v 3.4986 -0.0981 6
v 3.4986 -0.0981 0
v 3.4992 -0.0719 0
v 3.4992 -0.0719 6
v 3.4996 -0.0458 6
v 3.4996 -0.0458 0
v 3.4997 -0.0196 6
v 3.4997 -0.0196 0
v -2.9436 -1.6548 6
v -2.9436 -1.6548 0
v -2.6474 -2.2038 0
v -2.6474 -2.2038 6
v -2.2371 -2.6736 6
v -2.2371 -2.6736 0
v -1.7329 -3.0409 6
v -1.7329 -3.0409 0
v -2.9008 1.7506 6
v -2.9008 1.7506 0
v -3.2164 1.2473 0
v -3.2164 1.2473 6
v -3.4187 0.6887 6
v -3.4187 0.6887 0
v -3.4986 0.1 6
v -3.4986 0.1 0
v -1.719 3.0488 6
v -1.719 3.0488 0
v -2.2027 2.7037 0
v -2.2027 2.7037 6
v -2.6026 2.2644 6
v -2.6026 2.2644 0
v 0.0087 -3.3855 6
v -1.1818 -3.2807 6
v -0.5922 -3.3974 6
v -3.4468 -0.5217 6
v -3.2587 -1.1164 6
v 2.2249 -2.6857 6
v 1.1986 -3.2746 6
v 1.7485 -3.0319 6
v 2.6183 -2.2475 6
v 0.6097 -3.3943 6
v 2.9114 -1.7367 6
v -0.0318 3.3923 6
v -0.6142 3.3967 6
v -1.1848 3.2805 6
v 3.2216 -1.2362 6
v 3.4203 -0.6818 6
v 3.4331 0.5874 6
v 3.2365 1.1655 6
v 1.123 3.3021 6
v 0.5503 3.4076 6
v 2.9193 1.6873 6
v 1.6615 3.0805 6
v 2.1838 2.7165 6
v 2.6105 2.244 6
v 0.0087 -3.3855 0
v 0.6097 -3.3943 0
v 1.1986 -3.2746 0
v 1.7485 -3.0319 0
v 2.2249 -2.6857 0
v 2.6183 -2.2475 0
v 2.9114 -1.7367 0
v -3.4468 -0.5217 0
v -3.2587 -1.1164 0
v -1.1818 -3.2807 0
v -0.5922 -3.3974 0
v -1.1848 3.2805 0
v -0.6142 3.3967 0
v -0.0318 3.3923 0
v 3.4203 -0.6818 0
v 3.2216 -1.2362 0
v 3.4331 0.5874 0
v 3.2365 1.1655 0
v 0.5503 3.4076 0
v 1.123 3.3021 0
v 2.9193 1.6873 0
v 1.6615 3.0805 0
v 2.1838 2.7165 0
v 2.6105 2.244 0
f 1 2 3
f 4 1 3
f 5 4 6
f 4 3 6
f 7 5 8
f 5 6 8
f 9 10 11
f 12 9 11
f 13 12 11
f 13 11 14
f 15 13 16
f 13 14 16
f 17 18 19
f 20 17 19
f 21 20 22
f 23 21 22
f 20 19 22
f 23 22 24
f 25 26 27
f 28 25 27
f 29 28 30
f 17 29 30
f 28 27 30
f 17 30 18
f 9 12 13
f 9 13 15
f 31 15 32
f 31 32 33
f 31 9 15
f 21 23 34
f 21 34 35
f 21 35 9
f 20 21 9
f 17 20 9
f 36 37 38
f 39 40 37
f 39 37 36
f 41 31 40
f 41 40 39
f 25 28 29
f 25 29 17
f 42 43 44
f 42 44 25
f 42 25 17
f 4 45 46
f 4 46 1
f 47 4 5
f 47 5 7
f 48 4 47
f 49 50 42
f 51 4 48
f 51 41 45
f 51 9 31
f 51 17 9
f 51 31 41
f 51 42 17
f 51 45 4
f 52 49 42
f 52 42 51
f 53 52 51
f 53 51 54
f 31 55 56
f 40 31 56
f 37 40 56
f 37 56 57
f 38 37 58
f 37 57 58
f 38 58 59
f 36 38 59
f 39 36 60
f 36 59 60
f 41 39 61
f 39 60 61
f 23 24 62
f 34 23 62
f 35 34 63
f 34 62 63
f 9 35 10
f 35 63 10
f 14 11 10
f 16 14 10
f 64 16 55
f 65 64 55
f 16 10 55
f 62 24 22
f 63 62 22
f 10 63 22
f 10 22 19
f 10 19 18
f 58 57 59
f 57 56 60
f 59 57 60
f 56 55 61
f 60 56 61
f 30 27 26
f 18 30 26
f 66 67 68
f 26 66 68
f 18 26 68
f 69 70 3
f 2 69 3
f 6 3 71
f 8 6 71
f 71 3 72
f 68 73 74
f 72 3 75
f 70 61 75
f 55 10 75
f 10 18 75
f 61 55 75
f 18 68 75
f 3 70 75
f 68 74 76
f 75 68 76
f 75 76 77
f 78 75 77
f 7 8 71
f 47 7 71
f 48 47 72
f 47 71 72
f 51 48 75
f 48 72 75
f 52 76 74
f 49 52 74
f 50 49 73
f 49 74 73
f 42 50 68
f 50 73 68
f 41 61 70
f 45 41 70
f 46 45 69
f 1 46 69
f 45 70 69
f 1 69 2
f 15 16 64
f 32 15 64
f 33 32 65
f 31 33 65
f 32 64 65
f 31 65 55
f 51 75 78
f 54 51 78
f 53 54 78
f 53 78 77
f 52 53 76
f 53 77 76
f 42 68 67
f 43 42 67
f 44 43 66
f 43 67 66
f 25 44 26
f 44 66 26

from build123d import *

# Parameters (mm, degrees)
F1_DEPTH = 6


with BuildPart() as f1:
    # F0 (on Top) → F1 (new body)
    with BuildSketch(Plane.XY):
        with BuildLine():
            ThreePointArc((1.8973233508, 1.0666051117), (1.0588867343, 1.8135272069), (-0.005583815, 2.1709779391))
            ThreePointArc((-0.005583815, 2.1709779391), (-1.0389548617, 1.8249950782), (-1.8619798916, 1.1107194588))
            ThreePointArc((-1.8619798916, 1.1107194588), (-2.1000901385, 0.0125561815), (-1.887280493, -1.090789244))
            ThreePointArc((-1.887280493, -1.090789244), (-1.0429983237, -1.8228679145), (0.0203406306, -2.1664691802))
            ThreePointArc((0.0203406306, -2.1664691802), (1.0412894646, -1.8236634498), (1.8573263997, -1.1208576368))
            ThreePointArc((1.8573263997, -1.1208576368), (2.038872301, -0.5632237434), (2.1002855998, 0.0199939519))
            ThreePointArc((2.1002855998, 0.0199939519), (2.0490767616, 0.5530484975), (1.8973233508, 1.0666051117))
        make_face()
        with BuildLine():
            ThreePointArc((-0.005583815, 2.1709779391), (-0.5902408798, 2.1811969924), (-1.1642709913, 2.0697620621))
            ThreePointArc((-1.1642709913, 2.0697620621), (-1.5644851841, 1.6276052627), (-1.8619798916, 1.1107194588))
            ThreePointArc((-1.8619798916, 1.1107194588), (-1.0389548617, 1.8249950782), (-0.005583815, 2.1709779391))
        make_face()
        with BuildLine():
            ThreePointArc((1.2254840668, 2.0531222957), (0.6904787067, 2.450500715), (0.0767181369, 2.7101895796))
            ThreePointArc((0.0767181369, 2.7101895796), (-0.5843437882, 2.4685852693), (-1.1642709913, 2.0697620621))
            ThreePointArc((-1.1642709913, 2.0697620621), (-0.5902408798, 2.1811969924), (-0.005583815, 2.1709779391))
            ThreePointArc((-0.005583815, 2.1709779391), (0.6165382251, 2.1808664854), (1.2254840668, 2.0531222957))
        make_face()
        with BuildLine():
            ThreePointArc((0.0767181369, 2.7101895796), (-0.739408057, 2.819712583), (-1.5521012699, 2.6870966167))
            ThreePointArc((-1.5521012699, 2.6870966167), (-2.0648276585, 2.0630888944), (-2.3781173595, 1.31869414))
            ThreePointArc((-2.3781173595, 1.31869414), (-1.8198590259, 1.7728783139), (-1.1642709913, 2.0697620621))
            ThreePointArc((-1.1642709913, 2.0697620621), (-0.5843437882, 2.4685852693), (0.0767181369, 2.7101895796))
        make_face()
        with BuildLine():
            ThreePointArc((-1.1642709913, 2.0697620621), (-1.8198590259, 1.7728783139), (-2.3781173595, 1.31869414))
            ThreePointArc((-2.3781173595, 1.31869414), (-2.4675701182, 0.6431282617), (-2.3911766581, -0.0340386978))
            ThreePointArc((-2.3911766581, -0.0340386978), (-2.1918687447, 0.5685227429), (-1.8619798916, 1.1107194588))
            ThreePointArc((-1.8619798916, 1.1107194588), (-1.5644851841, 1.6276052627), (-1.1642709913, 2.0697620621))
        make_face()
        with BuildLine():
            ThreePointArc((-1.8619798916, 1.1107194588), (-2.1918687447, 0.5685227429), (-2.3911766581, -0.0340386978))
            ThreePointArc((-2.3911766581, -0.0340386978), (-2.1950769, -0.5890444341), (-1.887280493, -1.090789244))
            ThreePointArc((-1.887280493, -1.090789244), (-2.1000901385, 0.0125561815), (-1.8619798916, 1.1107194588))
        make_face()
        with BuildLine():
            ThreePointArc((-2.3781173595, 1.31869414), (-2.8167952616, 0.7101612068), (-3.0781623915, 0.0069984548))
            ThreePointArc((-3.0781623915, 0.0069984548), (-2.8091128769, -0.7177567759), (-2.352128639, -1.3413136635))
            ThreePointArc((-2.352128639, -1.3413136635), (-2.4490500667, -0.6899880247), (-2.3911766581, -0.0340386978))
            ThreePointArc((-2.3911766581, -0.0340386978), (-2.4675701182, 0.6431282617), (-2.3781173595, 1.31869414))
        make_face()
        with BuildLine():
            ThreePointArc((-1.5521012699, 2.6870966167), (-2.2966660757, 2.3199385917), (-2.9008495072, 1.7506020071))
            ThreePointArc((-2.9008495072, 1.7506020071), (-3.1294418909, 0.8930307855), (-3.0781623915, 0.0069984548))
            ThreePointArc((-3.0781623915, 0.0069984548), (-2.8167952616, 0.7101612068), (-2.3781173595, 1.31869414))
            ThreePointArc((-2.3781173595, 1.31869414), (-2.0648276585, 2.0630888944), (-1.5521012699, 2.6870966167))
        make_face()
        with BuildLine():
            ThreePointArc((1.5893790918, 2.6352836652), (0.8408625527, 3.1467868797), (-0.0318499268, 3.3923178874))
            ThreePointArc((-0.0318499268, 3.3923178874), (-0.8459741382, 3.1561123524), (-1.5521012699, 2.6870966167))
            ThreePointArc((-1.5521012699, 2.6870966167), (-0.739408057, 2.819712583), (0.0767181369, 2.7101895796))
            ThreePointArc((0.0767181369, 2.7101895796), (0.8382093308, 2.7769528833), (1.5893790918, 2.6352836652))
        make_face()
        with BuildLine():
            ThreePointArc((2.9193048787, 1.687267141), (2.4106234404, 2.4924162866), (1.6614974205, 3.0804912468))
            ThreePointArc((1.6614974205, 3.0804912468), (0.839387863, 3.3697978552), (-0.0318499268, 3.3923178874))
            ThreePointArc((-0.0318499268, 3.3923178874), (0.8408625527, 3.1467868797), (1.5893790918, 2.6352836652))
            ThreePointArc((1.5893790918, 2.6352836652), (2.3249996844, 2.2603976164), (2.9193048787, 1.687267141))
        make_face()
        with BuildLine():
            ThreePointArc((-0.0318499268, 3.3923178874), (-0.9025110684, 3.3534434902), (-1.7190434975, 3.0487521142))
            ThreePointArc((-1.7190434975, 3.0487521142), (-2.414314987, 2.4946917294), (-2.9008495072, 1.7506020071))
            ThreePointArc((-2.9008495072, 1.7506020071), (-2.2966660757, 2.3199385917), (-1.5521012699, 2.6870966167))
            ThreePointArc((-1.5521012699, 2.6870966167), (-0.8459741382, 3.1561123524), (-0.0318499268, 3.3923178874))
        make_face()
        with BuildLine():
            ThreePointArc((1.8973233508, 1.0666051117), (1.6145801233, 1.5960779783), (1.2254840668, 2.0531222957))
            ThreePointArc((1.2254840668, 2.0531222957), (0.6165382251, 2.1808664854), (-0.005583815, 2.1709779391))
            ThreePointArc((-0.005583815, 2.1709779391), (1.0588867343, 1.8135272069), (1.8973233508, 1.0666051117))
        make_face()
        with BuildLine():
            ThreePointArc((2.3580216147, 1.3446741637), (2.0618651, 2.042486798), (1.5893790918, 2.6352836652))
            ThreePointArc((1.5893790918, 2.6352836652), (0.8382093308, 2.7769528833), (0.0767181369, 2.7101895796))
            ThreePointArc((0.0767181369, 2.7101895796), (0.6904787067, 2.450500715), (1.2254840668, 2.0531222957))
            ThreePointArc((1.2254840668, 2.0531222957), (1.8346212871, 1.7674284762), (2.3580216147, 1.3446741637))
        make_face()
        with BuildLine():
            ThreePointArc((3.132299411, 0.6160982888), (3.0785345893, 1.1621681975), (2.9193048787, 1.687267141))
            ThreePointArc((2.9193048787, 1.687267141), (2.3249996844, 2.2603976164), (1.5893790918, 2.6352836652))
            ThreePointArc((1.5893790918, 2.6352836652), (2.0618651, 2.042486798), (2.3580216147, 1.3446741637))
            ThreePointArc((2.3580216147, 1.3446741637), (2.8033879252, 0.7424702765), (3.073177752, 0.0437470684))
            ThreePointArc((3.073177752, 0.0437470684), (3.1174797781, 0.3283999702), (3.132299411, 0.6160982888))
        make_face()
        with BuildLine():
            ThreePointArc((2.9114065493, -1.7367297688), (3.3355847665, -0.9642066281), (3.4986248701, -0.0981020804))
            ThreePointArc((3.4986248701, -0.0981020804), (3.499449935, -0.058865091), (3.4997249747, -0.0196203918))
            ThreePointArc((3.4997249747, -0.0196203918), (3.3506515798, 0.8818163139), (2.9193048787, 1.687267141))
            ThreePointArc((2.9193048787, 1.687267141), (3.0785345893, 1.1621681975), (3.132299411, 0.6160982888))
            ThreePointArc((3.132299411, 0.6160982888), (3.1174797781, 0.3283999702), (3.073177752, 0.0437470684))
            ThreePointArc((3.073177752, 0.0437470684), (3.1305048937, -0.2790773714), (3.149701683, -0.6063899182))
            ThreePointArc((3.149701683, -0.6063899182), (3.0894802895, -1.1839824971), (2.9114065493, -1.7367297688))
        make_face()
        with BuildLine():
            ThreePointArc((2.3638389968, -1.3107766193), (2.8127584052, -0.6828717562), (3.073177752, 0.0437470684))
            ThreePointArc((3.073177752, 0.0437470684), (2.8033879252, 0.7424702765), (2.3580216147, 1.3446741637))
            ThreePointArc((2.3580216147, 1.3446741637), (2.431540361, 0.9804761247), (2.4561912927, 0.6097504185))
            ThreePointArc((2.4561912927, 0.6097504185), (2.439034886, 0.3002644976), (2.3877759104, -0.0054288045))
            ThreePointArc((2.3877759104, -0.0054288045), (2.4369622669, -0.3050226541), (2.4534222262, -0.6081807681))
            ThreePointArc((2.4534222262, -0.6081807681), (2.4309361288, -0.9623227189), (2.3638389968, -1.3107766193))
        make_face()
        with BuildLine():
            ThreePointArc((2.4561912927, 0.6097504185), (2.431540361, 0.9804761247), (2.3580216147, 1.3446741637))
            ThreePointArc((2.3580216147, 1.3446741637), (1.8346212871, 1.7674284762), (1.2254840668, 2.0531222957))
            ThreePointArc((1.2254840668, 2.0531222957), (1.6145801233, 1.5960779783), (1.8973233508, 1.0666051117))
            ThreePointArc((1.8973233508, 1.0666051117), (2.1996094571, 0.5566928668), (2.3877759104, -0.0054288045))
            ThreePointArc((2.3877759104, -0.0054288045), (2.439034886, 0.3002644976), (2.4561912927, 0.6097504185))
        make_face()
        with BuildLine():
            ThreePointArc((1.8573263997, -1.1208576368), (2.1848226104, -0.5927568204), (2.3877759104, -0.0054288045))
            ThreePointArc((2.3877759104, -0.0054288045), (2.1996094571, 0.5566928668), (1.8973233508, 1.0666051117))
            ThreePointArc((1.8973233508, 1.0666051117), (2.0490767616, 0.5530484975), (2.1002855998, 0.0199939519))
            ThreePointArc((2.1002855998, 0.0199939519), (2.038872301, -0.5632237434), (1.8573263997, -1.1208576368))
        make_face()
        with BuildLine():
            ThreePointArc((1.1846862806, -2.051004376), (1.8210042954, -1.7553480562), (2.3638389968, -1.3107766193))
            ThreePointArc((2.3638389968, -1.3107766193), (2.4309361288, -0.9623227189), (2.4534222262, -0.6081807681))
            ThreePointArc((2.4534222262, -0.6081807681), (2.4369622669, -0.3050226541), (2.3877759104, -0.0054288045))
            ThreePointArc((2.3877759104, -0.0054288045), (2.1848226104, -0.5927568204), (1.8573263997, -1.1208576368))
            ThreePointArc((1.8573263997, -1.1208576368), (1.5691826547, -1.6207699415), (1.1846862806, -2.051004376))
        make_face()
        with BuildLine():
            ThreePointArc((1.5174181922, -2.6975632221), (2.2887744198, -2.3250318217), (2.9114065493, -1.7367297688))
            ThreePointArc((2.9114065493, -1.7367297688), (3.0894802895, -1.1839824971), (3.149701683, -0.6063899182))
            ThreePointArc((3.149701683, -0.6063899182), (3.1305048937, -0.2790773714), (3.073177752, 0.0437470684))
            ThreePointArc((3.073177752, 0.0437470684), (2.8127584052, -0.6828717562), (2.3638389968, -1.3107766193))
            ThreePointArc((2.3638389968, -1.3107766193), (2.0434237412, -2.0669106124), (1.5174181922, -2.6975632221))
        make_face()
        with BuildLine():
            ThreePointArc((0.0087077242, -3.3855486255), (0.9073754248, -3.3502922484), (1.7485083631, -3.031949621))
            ThreePointArc((1.7485083631, -3.031949621), (2.4331631162, -2.4770017048), (2.9114065493, -1.7367297688))
            ThreePointArc((2.9114065493, -1.7367297688), (2.2887744198, -2.3250318217), (1.5174181922, -2.6975632221))
            ThreePointArc((1.5174181922, -2.6975632221), (0.815159517, -3.1558005332), (0.0087077242, -3.3855486255))
        make_face()
        with BuildLine():
            ThreePointArc((-0.0767075624, -2.7098160195), (0.7212457483, -2.8195376864), (1.5174181922, -2.6975632221))
            ThreePointArc((1.5174181922, -2.6975632221), (2.0434237412, -2.0669106124), (2.3638389968, -1.3107766193))
            ThreePointArc((2.3638389968, -1.3107766193), (1.8210042954, -1.7553480562), (1.1846862806, -2.051004376))
            ThreePointArc((1.1846862806, -2.051004376), (0.5965422532, -2.4618841048), (-0.0767075624, -2.7098160195))
        make_face()
        with BuildLine():
            ThreePointArc((0.0203406306, -2.1664691802), (0.6086120241, -2.1702346669), (1.1846862806, -2.051004376))
            ThreePointArc((1.1846862806, -2.051004376), (1.5691826547, -1.6207699415), (1.8573263997, -1.1208576368))
            ThreePointArc((1.8573263997, -1.1208576368), (1.0412894646, -1.8236634498), (0.0203406306, -2.1664691802))
        make_face()
        with BuildLine():
            ThreePointArc((-1.2334628244, -2.0451536385), (-0.6952497963, -2.4473859053), (-0.0767075624, -2.7098160195))
            ThreePointArc((-0.0767075624, -2.7098160195), (0.5965422532, -2.4618841048), (1.1846862806, -2.051004376))
            ThreePointArc((1.1846862806, -2.051004376), (0.6086120241, -2.1702346669), (0.0203406306, -2.1664691802))
            ThreePointArc((0.0203406306, -2.1664691802), (-0.6134717997, -2.1772339404), (-1.2334628244, -2.0451536385))
        make_face()
        with BuildLine():
            ThreePointArc((-1.575496784, -2.6395182621), (-0.8432138017, -3.1395603915), (0.0087077242, -3.3855486255))
            ThreePointArc((0.0087077242, -3.3855486255), (0.815159517, -3.1558005332), (1.5174181922, -2.6975632221))
            ThreePointArc((1.5174181922, -2.6975632221), (0.7212457483, -2.8195376864), (-0.0767075624, -2.7098160195))
            ThreePointArc((-0.0767075624, -2.7098160195), (-0.8308986708, -2.7769312683), (-1.575496784, -2.6395182621))
        make_face()
        with BuildLine():
            ThreePointArc((-2.352128639, -1.3413136635), (-2.0531471779, -2.0438589967), (-1.575496784, -2.6395182621))
            ThreePointArc((-1.575496784, -2.6395182621), (-0.8308986708, -2.7769312683), (-0.0767075624, -2.7098160195))
            ThreePointArc((-0.0767075624, -2.7098160195), (-0.6952497963, -2.4473859053), (-1.2334628244, -2.0451536385))
            ThreePointArc((-1.2334628244, -2.0451536385), (-1.8349193921, -1.7601839531), (-2.352128639, -1.3413136635))
        make_face()
        with BuildLine():
            ThreePointArc((-2.9436155248, -1.6547919279), (-2.4553910421, -2.450165187), (-1.7328887652, -3.0409038997))
            ThreePointArc((-1.7328887652, -3.0409038997), (-0.890129417, -3.3549154862), (0.0087077242, -3.3855486255))
            ThreePointArc((0.0087077242, -3.3855486255), (-0.8432138017, -3.1395603915), (-1.575496784, -2.6395182621))
            ThreePointArc((-1.575496784, -2.6395182621), (-2.3354184647, -2.2525535644), (-2.9436155248, -1.6547919279))
        make_face()
        with BuildLine():
            ThreePointArc((-1.887280493, -1.090789244), (-1.6101970243, -1.602105892), (-1.2334628244, -2.0451536385))
            ThreePointArc((-1.2334628244, -2.0451536385), (-0.6134717997, -2.1772339404), (0.0203406306, -2.1664691802))
            ThreePointArc((0.0203406306, -2.1664691802), (-1.0429983237, -1.8228679145), (-1.887280493, -1.090789244))
        make_face()
        with BuildLine():
            ThreePointArc((-2.3911766581, -0.0340386978), (-2.4490500667, -0.6899880247), (-2.352128639, -1.3413136635))
            ThreePointArc((-2.352128639, -1.3413136635), (-1.8349193921, -1.7601839531), (-1.2334628244, -2.0451536385))
            ThreePointArc((-1.2334628244, -2.0451536385), (-1.6101970243, -1.602105892), (-1.887280493, -1.090789244))
            ThreePointArc((-1.887280493, -1.090789244), (-2.1950769, -0.5890444341), (-2.3911766581, -0.0340386978))
        make_face()
        with BuildLine():
            ThreePointArc((-3.0781623915, 0.0069984548), (-3.1374451848, -0.8341433621), (-2.9436155248, -1.6547919279))
            ThreePointArc((-2.9436155248, -1.6547919279), (-2.3354184647, -2.2525535644), (-1.575496784, -2.6395182621))
            ThreePointArc((-1.575496784, -2.6395182621), (-2.0531471779, -2.0438589967), (-2.352128639, -1.3413136635))
            ThreePointArc((-2.352128639, -1.3413136635), (-2.8091128769, -0.7177567759), (-3.0781623915, 0.0069984548))
        make_face()
        with BuildLine():
            ThreePointArc((-2.9008495072, 1.7506020071), (-3.3324180324, 0.9733415197), (-3.4985719993, 0.0999698254))
            ThreePointArc((-3.4985719993, 0.0999698254), (-3.3693868687, -0.8243098508), (-2.9436155248, -1.6547919279))
            ThreePointArc((-2.9436155248, -1.6547919279), (-3.1374451848, -0.8341433621), (-3.0781623915, 0.0069984548))
            ThreePointArc((-3.0781623915, 0.0069984548), (-3.1294418909, 0.8930307855), (-2.9008495072, 1.7506020071))
        make_face()
    extrude(amount=F1_DEPTH)


solid = f1.part
